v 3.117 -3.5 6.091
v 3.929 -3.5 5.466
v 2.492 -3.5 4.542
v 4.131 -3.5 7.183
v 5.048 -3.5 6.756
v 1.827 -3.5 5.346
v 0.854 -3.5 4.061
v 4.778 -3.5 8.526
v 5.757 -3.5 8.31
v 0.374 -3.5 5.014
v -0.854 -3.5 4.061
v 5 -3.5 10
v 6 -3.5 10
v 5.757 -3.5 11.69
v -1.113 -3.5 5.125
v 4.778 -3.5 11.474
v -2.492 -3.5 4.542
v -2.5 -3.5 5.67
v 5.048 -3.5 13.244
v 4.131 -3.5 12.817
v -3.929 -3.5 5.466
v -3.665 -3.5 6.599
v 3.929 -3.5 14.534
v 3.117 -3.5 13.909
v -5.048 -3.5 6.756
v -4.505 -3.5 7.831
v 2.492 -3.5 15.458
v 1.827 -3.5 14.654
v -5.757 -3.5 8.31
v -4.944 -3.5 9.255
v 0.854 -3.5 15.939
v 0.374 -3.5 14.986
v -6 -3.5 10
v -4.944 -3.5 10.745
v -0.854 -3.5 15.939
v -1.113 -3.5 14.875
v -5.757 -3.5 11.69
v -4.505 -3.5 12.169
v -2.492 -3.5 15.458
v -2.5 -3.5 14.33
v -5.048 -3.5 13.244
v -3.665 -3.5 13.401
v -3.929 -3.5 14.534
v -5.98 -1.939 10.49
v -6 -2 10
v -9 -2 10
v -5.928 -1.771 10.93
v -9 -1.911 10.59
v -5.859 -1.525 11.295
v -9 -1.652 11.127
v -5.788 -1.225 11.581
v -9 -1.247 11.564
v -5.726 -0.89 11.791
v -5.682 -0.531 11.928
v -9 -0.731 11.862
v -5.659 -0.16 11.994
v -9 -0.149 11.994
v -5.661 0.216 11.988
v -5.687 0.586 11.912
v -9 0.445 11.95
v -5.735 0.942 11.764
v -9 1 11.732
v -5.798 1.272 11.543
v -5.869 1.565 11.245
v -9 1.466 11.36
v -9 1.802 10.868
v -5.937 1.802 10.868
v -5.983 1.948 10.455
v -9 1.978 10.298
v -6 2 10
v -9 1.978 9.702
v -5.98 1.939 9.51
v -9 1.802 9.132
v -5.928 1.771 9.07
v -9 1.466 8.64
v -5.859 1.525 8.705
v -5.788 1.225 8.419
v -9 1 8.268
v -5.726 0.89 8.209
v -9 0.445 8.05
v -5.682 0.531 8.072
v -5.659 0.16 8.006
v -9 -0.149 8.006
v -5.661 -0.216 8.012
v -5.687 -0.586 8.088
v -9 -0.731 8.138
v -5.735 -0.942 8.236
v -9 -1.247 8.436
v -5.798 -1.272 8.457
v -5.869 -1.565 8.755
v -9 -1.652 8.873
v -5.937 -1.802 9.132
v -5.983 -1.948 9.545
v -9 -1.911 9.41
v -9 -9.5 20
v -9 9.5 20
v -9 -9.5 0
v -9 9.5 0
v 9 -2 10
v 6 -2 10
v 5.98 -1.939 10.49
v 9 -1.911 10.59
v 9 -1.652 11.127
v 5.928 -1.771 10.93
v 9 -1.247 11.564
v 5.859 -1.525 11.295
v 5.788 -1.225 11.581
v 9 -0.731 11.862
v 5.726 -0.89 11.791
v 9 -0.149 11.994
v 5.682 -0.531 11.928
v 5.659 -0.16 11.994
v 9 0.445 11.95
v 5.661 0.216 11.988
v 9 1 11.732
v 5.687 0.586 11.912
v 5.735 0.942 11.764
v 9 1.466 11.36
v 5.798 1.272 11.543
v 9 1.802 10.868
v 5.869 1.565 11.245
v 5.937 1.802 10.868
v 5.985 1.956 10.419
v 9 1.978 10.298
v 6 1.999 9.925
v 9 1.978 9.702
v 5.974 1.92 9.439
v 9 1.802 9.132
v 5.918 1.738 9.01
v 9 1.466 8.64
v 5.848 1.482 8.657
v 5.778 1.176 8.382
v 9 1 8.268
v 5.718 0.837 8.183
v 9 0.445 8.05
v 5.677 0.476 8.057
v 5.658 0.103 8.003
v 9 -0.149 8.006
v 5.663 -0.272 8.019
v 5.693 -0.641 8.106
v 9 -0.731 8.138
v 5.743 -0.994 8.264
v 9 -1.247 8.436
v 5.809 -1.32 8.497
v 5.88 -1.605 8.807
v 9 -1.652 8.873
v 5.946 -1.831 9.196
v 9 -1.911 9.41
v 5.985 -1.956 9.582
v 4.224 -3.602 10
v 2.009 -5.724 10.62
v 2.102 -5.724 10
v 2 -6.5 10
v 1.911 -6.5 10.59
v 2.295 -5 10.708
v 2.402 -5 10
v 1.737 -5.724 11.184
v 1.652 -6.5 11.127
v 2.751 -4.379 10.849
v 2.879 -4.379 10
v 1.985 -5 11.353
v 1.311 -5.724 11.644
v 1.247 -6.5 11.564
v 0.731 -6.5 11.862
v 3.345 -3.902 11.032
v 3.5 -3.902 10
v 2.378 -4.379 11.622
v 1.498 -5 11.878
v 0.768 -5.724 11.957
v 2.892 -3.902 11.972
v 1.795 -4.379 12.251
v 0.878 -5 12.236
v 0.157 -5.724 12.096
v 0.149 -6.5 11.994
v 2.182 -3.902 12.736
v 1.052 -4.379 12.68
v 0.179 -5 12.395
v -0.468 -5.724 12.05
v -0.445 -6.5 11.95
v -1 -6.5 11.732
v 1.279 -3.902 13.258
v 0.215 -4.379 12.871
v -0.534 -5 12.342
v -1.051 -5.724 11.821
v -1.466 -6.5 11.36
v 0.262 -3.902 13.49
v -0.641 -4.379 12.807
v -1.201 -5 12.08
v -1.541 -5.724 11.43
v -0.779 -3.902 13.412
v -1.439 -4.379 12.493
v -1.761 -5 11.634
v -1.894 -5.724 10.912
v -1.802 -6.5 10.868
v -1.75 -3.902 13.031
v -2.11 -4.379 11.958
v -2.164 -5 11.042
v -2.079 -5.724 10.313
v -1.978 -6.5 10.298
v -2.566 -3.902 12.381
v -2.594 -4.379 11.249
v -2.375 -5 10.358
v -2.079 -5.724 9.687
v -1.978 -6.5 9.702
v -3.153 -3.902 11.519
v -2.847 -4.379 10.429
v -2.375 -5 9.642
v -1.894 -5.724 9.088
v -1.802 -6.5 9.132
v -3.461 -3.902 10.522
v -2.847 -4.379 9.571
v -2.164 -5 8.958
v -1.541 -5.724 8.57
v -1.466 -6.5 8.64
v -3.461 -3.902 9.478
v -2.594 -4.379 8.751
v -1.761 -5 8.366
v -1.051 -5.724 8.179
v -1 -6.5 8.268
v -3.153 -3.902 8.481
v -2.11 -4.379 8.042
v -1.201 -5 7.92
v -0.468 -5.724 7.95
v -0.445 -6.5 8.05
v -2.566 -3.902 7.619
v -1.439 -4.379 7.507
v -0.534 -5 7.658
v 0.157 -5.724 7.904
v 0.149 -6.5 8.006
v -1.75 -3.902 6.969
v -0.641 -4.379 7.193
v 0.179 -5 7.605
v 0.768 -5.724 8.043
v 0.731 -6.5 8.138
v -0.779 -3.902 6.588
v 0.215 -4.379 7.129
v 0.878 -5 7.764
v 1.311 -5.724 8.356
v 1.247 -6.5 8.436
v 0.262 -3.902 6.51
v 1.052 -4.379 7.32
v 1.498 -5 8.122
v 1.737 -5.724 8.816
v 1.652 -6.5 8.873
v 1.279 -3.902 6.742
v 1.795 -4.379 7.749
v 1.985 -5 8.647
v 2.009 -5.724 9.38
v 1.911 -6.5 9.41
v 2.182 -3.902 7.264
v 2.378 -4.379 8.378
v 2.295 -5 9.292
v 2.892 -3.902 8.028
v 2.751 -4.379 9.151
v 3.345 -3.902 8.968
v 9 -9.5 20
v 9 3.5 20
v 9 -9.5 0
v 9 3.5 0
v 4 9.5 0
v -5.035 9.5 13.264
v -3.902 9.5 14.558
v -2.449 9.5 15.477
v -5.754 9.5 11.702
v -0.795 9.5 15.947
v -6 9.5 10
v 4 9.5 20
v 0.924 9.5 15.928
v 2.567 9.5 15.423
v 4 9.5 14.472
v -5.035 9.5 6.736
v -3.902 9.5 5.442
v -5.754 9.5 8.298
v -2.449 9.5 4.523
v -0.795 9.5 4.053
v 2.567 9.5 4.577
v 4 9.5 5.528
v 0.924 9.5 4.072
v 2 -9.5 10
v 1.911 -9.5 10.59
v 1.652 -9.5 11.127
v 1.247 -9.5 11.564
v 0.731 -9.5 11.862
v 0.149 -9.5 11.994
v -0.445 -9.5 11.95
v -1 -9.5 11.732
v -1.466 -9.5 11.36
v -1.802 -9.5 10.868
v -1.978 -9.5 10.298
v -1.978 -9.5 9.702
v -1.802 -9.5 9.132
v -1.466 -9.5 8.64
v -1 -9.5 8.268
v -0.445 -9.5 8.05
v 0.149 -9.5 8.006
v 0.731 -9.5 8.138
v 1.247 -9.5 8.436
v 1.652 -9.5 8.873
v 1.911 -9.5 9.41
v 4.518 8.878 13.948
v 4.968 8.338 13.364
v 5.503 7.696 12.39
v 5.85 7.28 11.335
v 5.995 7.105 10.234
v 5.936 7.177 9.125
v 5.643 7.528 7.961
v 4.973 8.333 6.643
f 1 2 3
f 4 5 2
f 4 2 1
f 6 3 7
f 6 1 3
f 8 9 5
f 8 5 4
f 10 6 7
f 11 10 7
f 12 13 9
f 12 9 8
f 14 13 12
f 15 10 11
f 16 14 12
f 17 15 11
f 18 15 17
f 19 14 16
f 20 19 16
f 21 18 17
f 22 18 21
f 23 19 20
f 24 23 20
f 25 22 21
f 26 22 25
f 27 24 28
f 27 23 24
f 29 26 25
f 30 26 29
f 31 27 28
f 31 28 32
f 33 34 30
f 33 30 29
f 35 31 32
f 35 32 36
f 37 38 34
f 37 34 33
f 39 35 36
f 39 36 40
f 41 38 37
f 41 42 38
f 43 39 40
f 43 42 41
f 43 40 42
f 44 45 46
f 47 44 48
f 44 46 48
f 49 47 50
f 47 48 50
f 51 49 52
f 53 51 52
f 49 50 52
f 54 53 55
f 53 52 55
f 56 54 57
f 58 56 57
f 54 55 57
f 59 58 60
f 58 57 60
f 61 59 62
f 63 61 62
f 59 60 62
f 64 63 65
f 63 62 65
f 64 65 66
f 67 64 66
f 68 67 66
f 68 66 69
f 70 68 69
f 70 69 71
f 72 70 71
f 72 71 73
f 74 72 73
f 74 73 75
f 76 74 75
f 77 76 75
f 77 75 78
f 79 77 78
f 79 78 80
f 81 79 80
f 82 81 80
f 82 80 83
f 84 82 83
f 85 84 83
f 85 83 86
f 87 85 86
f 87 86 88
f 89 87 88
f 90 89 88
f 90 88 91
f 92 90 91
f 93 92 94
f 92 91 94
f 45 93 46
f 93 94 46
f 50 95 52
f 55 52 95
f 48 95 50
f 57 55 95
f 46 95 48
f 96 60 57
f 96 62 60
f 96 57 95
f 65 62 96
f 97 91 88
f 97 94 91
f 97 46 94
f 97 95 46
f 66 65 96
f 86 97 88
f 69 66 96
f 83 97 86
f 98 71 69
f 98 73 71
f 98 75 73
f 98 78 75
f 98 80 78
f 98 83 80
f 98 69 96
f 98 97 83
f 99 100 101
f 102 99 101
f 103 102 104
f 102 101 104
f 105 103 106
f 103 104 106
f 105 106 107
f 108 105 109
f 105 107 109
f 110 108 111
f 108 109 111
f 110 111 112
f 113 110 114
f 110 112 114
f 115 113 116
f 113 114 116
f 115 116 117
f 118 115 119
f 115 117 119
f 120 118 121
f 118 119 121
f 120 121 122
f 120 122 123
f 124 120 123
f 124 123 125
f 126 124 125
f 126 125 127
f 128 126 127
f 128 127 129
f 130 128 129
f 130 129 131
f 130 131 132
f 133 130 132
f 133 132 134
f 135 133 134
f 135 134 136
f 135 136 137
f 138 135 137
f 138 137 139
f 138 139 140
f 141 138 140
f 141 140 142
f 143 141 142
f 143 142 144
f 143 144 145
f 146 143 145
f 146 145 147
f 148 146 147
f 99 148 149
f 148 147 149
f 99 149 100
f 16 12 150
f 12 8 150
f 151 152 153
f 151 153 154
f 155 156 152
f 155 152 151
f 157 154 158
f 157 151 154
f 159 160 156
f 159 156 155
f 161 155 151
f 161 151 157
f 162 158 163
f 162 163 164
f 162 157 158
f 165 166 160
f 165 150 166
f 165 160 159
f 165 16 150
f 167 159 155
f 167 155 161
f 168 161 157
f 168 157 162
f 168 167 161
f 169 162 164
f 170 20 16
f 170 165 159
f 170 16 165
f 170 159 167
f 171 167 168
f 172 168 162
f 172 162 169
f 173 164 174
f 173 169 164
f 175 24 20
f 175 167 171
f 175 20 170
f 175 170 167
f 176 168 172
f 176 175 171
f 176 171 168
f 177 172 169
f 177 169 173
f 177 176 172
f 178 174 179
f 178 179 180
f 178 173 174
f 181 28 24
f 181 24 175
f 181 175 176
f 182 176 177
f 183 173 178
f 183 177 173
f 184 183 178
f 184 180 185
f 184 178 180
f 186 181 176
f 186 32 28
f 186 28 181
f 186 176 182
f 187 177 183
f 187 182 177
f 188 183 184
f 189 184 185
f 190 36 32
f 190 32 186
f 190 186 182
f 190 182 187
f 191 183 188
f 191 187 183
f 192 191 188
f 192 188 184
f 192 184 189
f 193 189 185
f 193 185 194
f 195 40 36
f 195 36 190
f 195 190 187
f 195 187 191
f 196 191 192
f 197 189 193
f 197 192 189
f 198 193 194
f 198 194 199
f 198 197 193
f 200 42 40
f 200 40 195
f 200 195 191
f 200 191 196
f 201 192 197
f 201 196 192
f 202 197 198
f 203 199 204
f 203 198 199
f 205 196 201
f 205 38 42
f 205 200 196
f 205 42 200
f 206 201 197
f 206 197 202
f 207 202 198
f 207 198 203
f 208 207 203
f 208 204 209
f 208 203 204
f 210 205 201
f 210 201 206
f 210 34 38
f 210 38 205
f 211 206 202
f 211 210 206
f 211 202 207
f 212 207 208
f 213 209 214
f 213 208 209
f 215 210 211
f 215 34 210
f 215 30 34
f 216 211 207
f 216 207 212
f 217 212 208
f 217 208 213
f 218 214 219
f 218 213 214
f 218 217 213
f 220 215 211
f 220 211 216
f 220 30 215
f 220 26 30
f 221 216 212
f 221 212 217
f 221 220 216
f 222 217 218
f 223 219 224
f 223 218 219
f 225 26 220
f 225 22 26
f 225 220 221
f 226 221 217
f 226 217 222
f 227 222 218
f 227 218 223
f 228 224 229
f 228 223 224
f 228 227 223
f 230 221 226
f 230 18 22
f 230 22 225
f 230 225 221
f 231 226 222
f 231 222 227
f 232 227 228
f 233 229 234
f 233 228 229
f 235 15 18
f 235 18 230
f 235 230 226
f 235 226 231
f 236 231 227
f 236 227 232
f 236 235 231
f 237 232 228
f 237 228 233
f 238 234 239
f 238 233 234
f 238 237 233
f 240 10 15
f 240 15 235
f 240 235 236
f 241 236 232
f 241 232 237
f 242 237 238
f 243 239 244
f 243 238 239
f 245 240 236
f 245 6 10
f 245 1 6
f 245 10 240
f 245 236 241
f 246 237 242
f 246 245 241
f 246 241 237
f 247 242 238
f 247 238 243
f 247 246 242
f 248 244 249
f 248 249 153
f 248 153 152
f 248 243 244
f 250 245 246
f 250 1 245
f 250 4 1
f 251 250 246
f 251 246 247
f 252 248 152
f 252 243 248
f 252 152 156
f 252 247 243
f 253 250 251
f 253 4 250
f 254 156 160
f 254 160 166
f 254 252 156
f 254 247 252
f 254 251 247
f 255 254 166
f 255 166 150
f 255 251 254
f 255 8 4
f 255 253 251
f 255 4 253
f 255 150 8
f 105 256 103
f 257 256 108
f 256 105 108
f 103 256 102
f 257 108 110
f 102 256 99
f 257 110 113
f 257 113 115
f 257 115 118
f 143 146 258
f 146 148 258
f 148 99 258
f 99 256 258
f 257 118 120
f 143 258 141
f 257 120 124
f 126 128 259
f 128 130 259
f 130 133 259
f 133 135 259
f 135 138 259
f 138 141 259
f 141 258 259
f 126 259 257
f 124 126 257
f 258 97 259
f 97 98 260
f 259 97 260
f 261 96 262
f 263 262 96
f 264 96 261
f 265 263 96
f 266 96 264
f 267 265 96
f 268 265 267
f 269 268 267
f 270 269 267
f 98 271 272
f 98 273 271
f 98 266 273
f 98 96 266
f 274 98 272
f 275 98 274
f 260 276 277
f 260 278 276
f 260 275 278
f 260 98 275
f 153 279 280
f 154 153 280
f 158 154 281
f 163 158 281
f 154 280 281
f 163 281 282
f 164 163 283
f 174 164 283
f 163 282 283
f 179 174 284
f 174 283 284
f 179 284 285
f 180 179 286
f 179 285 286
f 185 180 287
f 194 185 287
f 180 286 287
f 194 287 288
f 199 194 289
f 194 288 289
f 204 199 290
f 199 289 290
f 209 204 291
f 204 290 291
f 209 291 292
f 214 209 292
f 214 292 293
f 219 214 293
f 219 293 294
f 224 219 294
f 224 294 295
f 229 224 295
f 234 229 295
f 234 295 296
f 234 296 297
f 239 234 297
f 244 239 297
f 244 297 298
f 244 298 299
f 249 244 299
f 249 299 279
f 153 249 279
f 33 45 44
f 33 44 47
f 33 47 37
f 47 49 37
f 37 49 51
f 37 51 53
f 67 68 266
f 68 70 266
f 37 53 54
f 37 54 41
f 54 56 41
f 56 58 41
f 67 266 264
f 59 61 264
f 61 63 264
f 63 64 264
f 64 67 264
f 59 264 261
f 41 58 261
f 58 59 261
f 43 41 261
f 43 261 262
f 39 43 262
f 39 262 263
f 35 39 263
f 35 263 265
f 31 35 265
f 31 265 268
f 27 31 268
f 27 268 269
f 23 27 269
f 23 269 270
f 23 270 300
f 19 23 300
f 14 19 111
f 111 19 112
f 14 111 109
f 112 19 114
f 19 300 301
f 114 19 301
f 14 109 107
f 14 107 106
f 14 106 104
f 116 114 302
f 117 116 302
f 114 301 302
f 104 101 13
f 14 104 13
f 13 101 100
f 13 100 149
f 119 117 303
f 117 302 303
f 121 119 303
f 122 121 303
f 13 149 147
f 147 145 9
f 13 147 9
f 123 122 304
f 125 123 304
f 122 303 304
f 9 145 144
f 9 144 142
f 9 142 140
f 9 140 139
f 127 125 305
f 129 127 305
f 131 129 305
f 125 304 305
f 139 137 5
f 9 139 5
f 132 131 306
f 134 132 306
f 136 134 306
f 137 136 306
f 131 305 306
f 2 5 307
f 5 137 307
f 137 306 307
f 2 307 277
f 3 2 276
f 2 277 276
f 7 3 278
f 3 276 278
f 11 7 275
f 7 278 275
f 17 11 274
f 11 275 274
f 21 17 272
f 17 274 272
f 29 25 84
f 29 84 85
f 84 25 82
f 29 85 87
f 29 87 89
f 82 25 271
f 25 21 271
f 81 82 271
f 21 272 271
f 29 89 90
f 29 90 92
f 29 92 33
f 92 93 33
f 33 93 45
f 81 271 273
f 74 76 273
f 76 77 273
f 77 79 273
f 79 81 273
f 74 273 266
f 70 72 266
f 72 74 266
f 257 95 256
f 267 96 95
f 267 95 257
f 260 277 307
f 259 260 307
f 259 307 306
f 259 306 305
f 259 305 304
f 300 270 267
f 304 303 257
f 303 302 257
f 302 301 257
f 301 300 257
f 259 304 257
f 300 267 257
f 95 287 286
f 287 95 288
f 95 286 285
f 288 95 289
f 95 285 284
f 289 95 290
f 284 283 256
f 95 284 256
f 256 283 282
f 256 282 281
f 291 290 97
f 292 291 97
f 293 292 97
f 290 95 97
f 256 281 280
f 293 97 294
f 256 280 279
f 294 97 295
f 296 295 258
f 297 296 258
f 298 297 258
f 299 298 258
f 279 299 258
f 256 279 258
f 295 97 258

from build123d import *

# Parameters (mm, degrees)
F0_W      = 18
F0_H      = 19
F1_DEPTH  = 20
F3_R      = 6
F4_DEPTH  = 13
F2_R      = 2
F5_DEPTH  = 18
F6_R      = 3
F7_R      = 2
F8_DEPTH  = 25
F10_DEPTH = 25


with BuildPart() as f1:
    # F0 (on Top) → F1 (new body)
    with BuildSketch(Plane.XY):
        Rectangle(F0_W, F0_H)
    extrude(amount=F1_DEPTH)

    # F3 (on face) → F4 (cut)
    with BuildSketch(Plane(origin=(0, 9.5, 0), x_dir=(-1, 0, 0), z_dir=(0, 1, 0))):
        with Locations((0, 10)):
            Circle(F3_R)
    extrude(amount=-F4_DEPTH, mode=Mode.SUBTRACT)

    # F2 (on face) → F5 (cut)
    with BuildSketch(Plane.XZ.offset(9.5)):
        with Locations((0, 10)):
            Circle(F2_R)
    extrude(amount=-F5_DEPTH, mode=Mode.SUBTRACT)

    # F6
    f6_edges = [f1.edges().sort_by_distance(p)[0] for p in [
        (-2, -3.5, 10),
    ]]
    fillet(f6_edges, radius=F6_R)

    # F7 (on face) → F8 (cut)
    with BuildSketch(Plane(origin=(-9, 0, 0), x_dir=(0, -1, 0), z_dir=(-1, 0, 0))):
        with Locations((0, 10)):
            Circle(F7_R)
    extrude(amount=-F8_DEPTH, mode=Mode.SUBTRACT)

    # F9 (on face) → F10 (cut)
    with BuildSketch(Plane.XY.offset(20)):
        Polygon((9, 9.5), (4, 9.5), (9, 3.5), align=None)
    extrude(amount=-F10_DEPTH, mode=Mode.SUBTRACT)


solid = f1.part
